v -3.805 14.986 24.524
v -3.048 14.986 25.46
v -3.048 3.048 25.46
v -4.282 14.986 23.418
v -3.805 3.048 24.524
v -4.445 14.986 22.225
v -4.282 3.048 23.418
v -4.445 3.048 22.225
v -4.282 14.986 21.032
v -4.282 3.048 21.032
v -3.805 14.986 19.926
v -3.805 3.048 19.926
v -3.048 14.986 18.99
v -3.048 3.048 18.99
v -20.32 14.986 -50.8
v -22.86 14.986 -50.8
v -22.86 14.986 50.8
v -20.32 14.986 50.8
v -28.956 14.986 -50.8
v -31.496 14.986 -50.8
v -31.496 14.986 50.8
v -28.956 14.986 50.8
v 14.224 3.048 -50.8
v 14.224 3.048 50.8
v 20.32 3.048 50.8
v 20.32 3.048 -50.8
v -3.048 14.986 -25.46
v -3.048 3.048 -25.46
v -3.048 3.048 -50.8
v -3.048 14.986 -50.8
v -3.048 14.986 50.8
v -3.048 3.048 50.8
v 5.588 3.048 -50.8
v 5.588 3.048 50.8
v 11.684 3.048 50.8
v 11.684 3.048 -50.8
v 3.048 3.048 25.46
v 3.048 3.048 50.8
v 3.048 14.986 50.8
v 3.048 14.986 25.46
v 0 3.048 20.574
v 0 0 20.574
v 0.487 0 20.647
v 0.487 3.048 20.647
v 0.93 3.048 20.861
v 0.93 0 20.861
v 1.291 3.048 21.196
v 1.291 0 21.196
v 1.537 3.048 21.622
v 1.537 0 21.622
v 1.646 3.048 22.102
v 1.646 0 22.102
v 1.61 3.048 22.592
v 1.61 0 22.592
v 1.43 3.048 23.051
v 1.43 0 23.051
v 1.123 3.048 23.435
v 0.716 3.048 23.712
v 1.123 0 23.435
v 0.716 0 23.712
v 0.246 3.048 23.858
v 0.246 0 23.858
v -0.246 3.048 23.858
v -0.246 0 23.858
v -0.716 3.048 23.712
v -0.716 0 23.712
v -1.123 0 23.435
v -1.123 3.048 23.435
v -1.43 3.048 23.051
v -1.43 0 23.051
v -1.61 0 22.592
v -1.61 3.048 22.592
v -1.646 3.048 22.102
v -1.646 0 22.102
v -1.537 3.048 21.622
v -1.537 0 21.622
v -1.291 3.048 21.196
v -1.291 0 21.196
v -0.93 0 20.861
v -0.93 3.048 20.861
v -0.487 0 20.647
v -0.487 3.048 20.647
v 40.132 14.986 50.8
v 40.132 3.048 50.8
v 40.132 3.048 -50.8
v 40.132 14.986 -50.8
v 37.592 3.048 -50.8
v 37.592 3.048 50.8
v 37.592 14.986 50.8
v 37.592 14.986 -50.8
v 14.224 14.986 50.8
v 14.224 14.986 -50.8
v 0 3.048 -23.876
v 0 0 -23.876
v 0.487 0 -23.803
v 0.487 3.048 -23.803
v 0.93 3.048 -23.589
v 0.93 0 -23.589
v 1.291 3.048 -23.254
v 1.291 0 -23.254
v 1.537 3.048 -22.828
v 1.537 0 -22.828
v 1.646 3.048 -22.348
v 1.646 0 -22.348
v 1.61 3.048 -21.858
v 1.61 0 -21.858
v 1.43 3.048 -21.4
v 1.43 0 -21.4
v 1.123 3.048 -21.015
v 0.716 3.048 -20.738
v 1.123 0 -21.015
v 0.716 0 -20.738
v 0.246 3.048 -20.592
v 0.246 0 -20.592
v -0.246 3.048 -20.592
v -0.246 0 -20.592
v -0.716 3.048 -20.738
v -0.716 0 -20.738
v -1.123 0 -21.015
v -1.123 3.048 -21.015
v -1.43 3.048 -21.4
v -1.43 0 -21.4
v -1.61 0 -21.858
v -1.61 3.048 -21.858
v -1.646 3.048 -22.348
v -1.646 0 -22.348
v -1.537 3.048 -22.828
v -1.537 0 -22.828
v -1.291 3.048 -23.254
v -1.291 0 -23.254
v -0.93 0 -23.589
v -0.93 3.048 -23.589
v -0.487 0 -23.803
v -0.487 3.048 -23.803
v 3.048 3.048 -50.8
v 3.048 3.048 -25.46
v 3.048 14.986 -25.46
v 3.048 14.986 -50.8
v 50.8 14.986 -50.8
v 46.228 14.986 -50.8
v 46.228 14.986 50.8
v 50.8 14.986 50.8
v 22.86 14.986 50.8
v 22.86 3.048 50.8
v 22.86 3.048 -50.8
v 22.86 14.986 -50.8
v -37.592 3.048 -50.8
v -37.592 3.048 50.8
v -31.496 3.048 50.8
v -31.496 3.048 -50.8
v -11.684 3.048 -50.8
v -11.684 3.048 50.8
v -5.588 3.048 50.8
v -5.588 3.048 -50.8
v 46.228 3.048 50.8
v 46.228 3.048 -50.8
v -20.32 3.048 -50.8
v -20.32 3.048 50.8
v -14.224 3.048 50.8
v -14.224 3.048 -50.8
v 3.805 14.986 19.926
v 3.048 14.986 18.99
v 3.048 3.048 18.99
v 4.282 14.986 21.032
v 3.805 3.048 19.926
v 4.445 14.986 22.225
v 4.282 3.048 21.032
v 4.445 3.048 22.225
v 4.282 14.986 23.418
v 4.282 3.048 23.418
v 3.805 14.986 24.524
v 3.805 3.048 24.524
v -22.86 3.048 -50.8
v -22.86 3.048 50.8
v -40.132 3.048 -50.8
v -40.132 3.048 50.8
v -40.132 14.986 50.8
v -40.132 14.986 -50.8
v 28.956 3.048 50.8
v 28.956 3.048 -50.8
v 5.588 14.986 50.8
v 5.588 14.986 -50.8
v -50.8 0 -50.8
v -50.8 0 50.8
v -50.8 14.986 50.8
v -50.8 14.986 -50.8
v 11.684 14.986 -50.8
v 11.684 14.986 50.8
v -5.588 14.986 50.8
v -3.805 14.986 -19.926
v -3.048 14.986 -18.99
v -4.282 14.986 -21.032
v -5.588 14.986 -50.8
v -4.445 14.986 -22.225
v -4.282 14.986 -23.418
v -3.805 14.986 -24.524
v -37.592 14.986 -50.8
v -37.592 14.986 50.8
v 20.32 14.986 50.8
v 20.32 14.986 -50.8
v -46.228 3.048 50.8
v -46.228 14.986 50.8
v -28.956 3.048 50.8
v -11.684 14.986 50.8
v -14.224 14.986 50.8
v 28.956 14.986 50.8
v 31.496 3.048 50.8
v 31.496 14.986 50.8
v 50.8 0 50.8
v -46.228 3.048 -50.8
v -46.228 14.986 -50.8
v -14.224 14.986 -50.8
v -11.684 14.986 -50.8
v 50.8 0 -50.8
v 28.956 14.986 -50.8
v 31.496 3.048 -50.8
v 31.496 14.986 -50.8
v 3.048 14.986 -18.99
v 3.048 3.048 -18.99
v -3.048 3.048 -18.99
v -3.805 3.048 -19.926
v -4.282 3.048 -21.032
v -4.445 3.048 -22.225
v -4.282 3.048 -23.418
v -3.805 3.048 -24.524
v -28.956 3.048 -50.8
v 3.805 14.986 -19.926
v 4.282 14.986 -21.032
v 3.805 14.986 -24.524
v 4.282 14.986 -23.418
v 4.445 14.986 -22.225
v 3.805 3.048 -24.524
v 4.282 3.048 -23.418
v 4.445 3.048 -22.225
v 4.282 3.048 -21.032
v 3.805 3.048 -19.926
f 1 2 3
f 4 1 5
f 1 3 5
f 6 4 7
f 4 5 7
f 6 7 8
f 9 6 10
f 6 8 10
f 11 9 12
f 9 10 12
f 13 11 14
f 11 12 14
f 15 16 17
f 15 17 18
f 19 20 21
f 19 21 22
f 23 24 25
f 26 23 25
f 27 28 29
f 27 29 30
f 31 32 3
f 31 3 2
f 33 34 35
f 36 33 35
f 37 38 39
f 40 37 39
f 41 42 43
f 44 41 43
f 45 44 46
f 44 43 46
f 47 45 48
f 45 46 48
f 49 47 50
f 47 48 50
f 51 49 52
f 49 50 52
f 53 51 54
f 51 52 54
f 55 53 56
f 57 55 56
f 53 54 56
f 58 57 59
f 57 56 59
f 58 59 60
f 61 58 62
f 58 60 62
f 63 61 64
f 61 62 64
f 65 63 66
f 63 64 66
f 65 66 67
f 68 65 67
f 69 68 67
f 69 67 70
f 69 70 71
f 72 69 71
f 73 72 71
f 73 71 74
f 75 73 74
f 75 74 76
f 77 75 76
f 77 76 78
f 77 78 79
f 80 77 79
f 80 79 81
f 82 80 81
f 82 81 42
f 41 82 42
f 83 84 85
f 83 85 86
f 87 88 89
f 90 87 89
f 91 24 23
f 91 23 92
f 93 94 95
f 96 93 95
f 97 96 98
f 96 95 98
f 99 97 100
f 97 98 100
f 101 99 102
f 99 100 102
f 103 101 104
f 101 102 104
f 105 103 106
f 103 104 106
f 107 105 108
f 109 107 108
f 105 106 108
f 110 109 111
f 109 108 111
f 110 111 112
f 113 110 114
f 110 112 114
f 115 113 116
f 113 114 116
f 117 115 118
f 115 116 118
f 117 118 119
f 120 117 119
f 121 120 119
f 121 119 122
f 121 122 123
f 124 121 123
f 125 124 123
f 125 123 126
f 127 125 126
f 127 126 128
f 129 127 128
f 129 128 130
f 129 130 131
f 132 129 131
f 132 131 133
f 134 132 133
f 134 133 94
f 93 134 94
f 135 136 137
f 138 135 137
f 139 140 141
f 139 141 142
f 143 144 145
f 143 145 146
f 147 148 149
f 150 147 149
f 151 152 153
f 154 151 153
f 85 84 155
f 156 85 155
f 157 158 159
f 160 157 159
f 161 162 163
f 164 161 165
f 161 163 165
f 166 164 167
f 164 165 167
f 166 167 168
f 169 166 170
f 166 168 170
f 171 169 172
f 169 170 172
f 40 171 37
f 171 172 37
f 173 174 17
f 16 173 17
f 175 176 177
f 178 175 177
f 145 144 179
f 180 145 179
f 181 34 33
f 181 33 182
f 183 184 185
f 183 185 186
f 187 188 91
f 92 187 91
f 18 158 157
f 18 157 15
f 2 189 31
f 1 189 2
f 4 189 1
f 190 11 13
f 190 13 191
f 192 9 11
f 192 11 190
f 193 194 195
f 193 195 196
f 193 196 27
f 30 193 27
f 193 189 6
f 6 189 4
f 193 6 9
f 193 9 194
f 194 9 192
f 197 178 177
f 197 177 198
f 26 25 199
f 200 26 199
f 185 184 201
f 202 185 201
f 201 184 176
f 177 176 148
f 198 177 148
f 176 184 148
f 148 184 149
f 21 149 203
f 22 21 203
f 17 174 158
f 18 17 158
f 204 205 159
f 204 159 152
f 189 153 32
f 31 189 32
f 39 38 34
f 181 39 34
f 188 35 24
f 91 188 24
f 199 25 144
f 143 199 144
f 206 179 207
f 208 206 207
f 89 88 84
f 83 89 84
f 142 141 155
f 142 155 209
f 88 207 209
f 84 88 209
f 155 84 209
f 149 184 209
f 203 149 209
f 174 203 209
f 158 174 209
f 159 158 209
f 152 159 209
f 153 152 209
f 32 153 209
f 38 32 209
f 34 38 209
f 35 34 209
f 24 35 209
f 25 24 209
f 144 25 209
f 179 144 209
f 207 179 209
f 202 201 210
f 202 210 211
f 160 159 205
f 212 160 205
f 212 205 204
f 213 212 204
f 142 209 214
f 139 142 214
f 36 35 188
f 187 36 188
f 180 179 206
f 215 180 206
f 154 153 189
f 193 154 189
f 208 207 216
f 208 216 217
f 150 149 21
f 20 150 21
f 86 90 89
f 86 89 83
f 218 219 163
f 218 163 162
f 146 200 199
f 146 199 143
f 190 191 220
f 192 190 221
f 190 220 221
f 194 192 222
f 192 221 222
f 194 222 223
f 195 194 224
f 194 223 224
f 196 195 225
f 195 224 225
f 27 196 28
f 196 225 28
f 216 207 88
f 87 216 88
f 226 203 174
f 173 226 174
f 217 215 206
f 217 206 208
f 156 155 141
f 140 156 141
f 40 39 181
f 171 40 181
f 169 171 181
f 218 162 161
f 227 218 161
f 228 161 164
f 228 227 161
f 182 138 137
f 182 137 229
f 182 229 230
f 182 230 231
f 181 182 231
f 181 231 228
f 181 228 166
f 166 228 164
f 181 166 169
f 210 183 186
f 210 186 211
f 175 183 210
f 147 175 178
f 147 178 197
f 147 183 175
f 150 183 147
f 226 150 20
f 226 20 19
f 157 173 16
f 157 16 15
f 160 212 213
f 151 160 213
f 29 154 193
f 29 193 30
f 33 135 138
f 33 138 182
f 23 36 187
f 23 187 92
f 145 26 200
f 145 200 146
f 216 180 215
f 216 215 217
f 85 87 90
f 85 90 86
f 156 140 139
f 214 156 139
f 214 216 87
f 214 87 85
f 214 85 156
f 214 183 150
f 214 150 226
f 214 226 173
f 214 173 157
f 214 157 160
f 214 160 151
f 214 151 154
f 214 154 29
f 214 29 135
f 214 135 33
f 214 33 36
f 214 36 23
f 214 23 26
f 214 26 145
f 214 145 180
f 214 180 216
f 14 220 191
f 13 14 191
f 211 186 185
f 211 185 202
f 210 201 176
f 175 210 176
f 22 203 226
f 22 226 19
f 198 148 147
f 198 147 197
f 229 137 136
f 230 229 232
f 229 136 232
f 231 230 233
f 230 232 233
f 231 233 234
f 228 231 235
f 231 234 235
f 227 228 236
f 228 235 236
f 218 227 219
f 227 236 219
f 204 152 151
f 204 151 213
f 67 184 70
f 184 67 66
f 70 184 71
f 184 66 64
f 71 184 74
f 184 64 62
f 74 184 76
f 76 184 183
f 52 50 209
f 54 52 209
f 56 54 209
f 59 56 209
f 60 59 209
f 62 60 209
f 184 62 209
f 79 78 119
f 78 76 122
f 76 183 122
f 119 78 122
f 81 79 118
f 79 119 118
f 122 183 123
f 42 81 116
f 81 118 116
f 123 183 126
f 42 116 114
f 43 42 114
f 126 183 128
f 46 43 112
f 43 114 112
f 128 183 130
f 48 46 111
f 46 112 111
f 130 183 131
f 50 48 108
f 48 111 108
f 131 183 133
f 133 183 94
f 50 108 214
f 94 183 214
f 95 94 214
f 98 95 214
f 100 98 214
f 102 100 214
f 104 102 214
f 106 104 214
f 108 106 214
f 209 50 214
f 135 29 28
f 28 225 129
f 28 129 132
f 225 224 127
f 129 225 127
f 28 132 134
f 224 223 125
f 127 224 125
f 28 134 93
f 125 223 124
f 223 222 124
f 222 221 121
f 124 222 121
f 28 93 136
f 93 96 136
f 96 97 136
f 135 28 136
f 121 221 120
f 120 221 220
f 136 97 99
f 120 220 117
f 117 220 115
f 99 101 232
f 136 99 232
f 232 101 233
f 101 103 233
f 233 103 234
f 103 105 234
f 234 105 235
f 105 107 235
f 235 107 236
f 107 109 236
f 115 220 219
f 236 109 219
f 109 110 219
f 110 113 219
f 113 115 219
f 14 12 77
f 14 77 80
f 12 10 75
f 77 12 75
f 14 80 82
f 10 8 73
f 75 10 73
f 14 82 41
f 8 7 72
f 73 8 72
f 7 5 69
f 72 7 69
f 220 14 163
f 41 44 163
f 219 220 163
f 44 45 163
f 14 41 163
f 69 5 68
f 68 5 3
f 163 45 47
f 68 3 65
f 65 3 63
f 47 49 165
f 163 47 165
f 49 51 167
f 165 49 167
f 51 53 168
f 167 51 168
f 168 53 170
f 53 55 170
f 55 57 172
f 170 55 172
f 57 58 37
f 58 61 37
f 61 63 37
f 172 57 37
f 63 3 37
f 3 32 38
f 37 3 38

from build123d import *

# Parameters (mm, degrees)
SKETCH1_W           = 101.6
SKETCH1_H           = 101.6
BOSS_EXTRUDE1_DEPTH = 14.986
SKETCH2_W           = 6.096
SKETCH2_H           = 11.938
CUT_EXTRUDE1_DEPTH  = 115.576525502
SKETCH3_R           = 1.651
CUT_EXTRUDE2_DEPTH  = 74.38842004
CUT_EXTRUDE3_START  = -3.048
SKETCH3_3_R         = 4.445
SKETCH3_3_R_2       = 1.651
CUT_EXTRUDE3_DEPTH  = 71.34042004


with BuildPart() as part:
    # Sketch1 → Boss-Extrude1 (new body)
    with BuildSketch(Plane(origin=(0, 0, 0), x_dir=(1, 0, 0), z_dir=(0, 1, 0))):
        Rectangle(SKETCH1_W, SKETCH1_H)
    extrude(amount=BOSS_EXTRUDE1_DEPTH)

    # Sketch2 → Cut-Extrude1 (cut, through all)
    with BuildSketch(Plane.XY.offset(50.8)):
        with Locations((43.18, 9.017)):
            Rectangle(SKETCH2_W, SKETCH2_H)
        with Locations((34.544, 9.017)):
            Rectangle(SKETCH2_W, SKETCH2_H)
        with Locations((25.908, 9.017)):
            Rectangle(SKETCH2_W, SKETCH2_H)
        with Locations((17.272, 9.017)):
            Rectangle(SKETCH2_W, SKETCH2_H)
        with Locations((8.636, 9.017)):
            Rectangle(SKETCH2_W, SKETCH2_H)
        with Locations((0, 9.017)):
            Rectangle(SKETCH2_W, SKETCH2_H)
        with Locations((-8.636, 9.017)):
            Rectangle(SKETCH2_W, SKETCH2_H)
        with Locations((-17.272, 9.017)):
            Rectangle(SKETCH2_W, SKETCH2_H)
        with Locations((-25.908, 9.017)):
            Rectangle(SKETCH2_W, SKETCH2_H)
        with Locations((-34.544, 9.017)):
            Rectangle(SKETCH2_W, SKETCH2_H)
        with Locations((-43.18, 9.017)):
            Rectangle(SKETCH2_W, SKETCH2_H)
    extrude(amount=-CUT_EXTRUDE1_DEPTH, mode=Mode.SUBTRACT)

    # Sketch3 → Cut-Extrude2 (cut, through all)
    with BuildSketch(Plane.XZ):
        with Locations(Location((0, 22.225, 0), (0, 0, 270))):
            Circle(SKETCH3_R)
        with Locations(Location((0, -22.225, 0), (0, 0, 270))):
            Circle(SKETCH3_R)
    extrude(amount=-CUT_EXTRUDE2_DEPTH, mode=Mode.SUBTRACT)

    # Sketch3<3> → Cut-Extrude3 (cut, through all)
    # profile 1 of 2: a face of its own
    with BuildSketch(Plane.XZ.offset(CUT_EXTRUDE3_START)):
        with Locations((0, 22.225)):
            Circle(SKETCH3_3_R)
        with Locations(Location((0, 22.225, 0), (0, 0, 270))):
            Circle(SKETCH3_3_R_2, mode=Mode.SUBTRACT)
    # profile 2 of 2: a face of its own
    with BuildSketch(Plane.XZ.offset(CUT_EXTRUDE3_START)):
        with Locations((0, -22.225)):
            Circle(SKETCH3_3_R)
        with Locations(Location((0, -22.225, 0), (0, 0, 270))):
            Circle(SKETCH3_3_R_2, mode=Mode.SUBTRACT)
    extrude(amount=-CUT_EXTRUDE3_DEPTH, mode=Mode.SUBTRACT)


solid = part.part
